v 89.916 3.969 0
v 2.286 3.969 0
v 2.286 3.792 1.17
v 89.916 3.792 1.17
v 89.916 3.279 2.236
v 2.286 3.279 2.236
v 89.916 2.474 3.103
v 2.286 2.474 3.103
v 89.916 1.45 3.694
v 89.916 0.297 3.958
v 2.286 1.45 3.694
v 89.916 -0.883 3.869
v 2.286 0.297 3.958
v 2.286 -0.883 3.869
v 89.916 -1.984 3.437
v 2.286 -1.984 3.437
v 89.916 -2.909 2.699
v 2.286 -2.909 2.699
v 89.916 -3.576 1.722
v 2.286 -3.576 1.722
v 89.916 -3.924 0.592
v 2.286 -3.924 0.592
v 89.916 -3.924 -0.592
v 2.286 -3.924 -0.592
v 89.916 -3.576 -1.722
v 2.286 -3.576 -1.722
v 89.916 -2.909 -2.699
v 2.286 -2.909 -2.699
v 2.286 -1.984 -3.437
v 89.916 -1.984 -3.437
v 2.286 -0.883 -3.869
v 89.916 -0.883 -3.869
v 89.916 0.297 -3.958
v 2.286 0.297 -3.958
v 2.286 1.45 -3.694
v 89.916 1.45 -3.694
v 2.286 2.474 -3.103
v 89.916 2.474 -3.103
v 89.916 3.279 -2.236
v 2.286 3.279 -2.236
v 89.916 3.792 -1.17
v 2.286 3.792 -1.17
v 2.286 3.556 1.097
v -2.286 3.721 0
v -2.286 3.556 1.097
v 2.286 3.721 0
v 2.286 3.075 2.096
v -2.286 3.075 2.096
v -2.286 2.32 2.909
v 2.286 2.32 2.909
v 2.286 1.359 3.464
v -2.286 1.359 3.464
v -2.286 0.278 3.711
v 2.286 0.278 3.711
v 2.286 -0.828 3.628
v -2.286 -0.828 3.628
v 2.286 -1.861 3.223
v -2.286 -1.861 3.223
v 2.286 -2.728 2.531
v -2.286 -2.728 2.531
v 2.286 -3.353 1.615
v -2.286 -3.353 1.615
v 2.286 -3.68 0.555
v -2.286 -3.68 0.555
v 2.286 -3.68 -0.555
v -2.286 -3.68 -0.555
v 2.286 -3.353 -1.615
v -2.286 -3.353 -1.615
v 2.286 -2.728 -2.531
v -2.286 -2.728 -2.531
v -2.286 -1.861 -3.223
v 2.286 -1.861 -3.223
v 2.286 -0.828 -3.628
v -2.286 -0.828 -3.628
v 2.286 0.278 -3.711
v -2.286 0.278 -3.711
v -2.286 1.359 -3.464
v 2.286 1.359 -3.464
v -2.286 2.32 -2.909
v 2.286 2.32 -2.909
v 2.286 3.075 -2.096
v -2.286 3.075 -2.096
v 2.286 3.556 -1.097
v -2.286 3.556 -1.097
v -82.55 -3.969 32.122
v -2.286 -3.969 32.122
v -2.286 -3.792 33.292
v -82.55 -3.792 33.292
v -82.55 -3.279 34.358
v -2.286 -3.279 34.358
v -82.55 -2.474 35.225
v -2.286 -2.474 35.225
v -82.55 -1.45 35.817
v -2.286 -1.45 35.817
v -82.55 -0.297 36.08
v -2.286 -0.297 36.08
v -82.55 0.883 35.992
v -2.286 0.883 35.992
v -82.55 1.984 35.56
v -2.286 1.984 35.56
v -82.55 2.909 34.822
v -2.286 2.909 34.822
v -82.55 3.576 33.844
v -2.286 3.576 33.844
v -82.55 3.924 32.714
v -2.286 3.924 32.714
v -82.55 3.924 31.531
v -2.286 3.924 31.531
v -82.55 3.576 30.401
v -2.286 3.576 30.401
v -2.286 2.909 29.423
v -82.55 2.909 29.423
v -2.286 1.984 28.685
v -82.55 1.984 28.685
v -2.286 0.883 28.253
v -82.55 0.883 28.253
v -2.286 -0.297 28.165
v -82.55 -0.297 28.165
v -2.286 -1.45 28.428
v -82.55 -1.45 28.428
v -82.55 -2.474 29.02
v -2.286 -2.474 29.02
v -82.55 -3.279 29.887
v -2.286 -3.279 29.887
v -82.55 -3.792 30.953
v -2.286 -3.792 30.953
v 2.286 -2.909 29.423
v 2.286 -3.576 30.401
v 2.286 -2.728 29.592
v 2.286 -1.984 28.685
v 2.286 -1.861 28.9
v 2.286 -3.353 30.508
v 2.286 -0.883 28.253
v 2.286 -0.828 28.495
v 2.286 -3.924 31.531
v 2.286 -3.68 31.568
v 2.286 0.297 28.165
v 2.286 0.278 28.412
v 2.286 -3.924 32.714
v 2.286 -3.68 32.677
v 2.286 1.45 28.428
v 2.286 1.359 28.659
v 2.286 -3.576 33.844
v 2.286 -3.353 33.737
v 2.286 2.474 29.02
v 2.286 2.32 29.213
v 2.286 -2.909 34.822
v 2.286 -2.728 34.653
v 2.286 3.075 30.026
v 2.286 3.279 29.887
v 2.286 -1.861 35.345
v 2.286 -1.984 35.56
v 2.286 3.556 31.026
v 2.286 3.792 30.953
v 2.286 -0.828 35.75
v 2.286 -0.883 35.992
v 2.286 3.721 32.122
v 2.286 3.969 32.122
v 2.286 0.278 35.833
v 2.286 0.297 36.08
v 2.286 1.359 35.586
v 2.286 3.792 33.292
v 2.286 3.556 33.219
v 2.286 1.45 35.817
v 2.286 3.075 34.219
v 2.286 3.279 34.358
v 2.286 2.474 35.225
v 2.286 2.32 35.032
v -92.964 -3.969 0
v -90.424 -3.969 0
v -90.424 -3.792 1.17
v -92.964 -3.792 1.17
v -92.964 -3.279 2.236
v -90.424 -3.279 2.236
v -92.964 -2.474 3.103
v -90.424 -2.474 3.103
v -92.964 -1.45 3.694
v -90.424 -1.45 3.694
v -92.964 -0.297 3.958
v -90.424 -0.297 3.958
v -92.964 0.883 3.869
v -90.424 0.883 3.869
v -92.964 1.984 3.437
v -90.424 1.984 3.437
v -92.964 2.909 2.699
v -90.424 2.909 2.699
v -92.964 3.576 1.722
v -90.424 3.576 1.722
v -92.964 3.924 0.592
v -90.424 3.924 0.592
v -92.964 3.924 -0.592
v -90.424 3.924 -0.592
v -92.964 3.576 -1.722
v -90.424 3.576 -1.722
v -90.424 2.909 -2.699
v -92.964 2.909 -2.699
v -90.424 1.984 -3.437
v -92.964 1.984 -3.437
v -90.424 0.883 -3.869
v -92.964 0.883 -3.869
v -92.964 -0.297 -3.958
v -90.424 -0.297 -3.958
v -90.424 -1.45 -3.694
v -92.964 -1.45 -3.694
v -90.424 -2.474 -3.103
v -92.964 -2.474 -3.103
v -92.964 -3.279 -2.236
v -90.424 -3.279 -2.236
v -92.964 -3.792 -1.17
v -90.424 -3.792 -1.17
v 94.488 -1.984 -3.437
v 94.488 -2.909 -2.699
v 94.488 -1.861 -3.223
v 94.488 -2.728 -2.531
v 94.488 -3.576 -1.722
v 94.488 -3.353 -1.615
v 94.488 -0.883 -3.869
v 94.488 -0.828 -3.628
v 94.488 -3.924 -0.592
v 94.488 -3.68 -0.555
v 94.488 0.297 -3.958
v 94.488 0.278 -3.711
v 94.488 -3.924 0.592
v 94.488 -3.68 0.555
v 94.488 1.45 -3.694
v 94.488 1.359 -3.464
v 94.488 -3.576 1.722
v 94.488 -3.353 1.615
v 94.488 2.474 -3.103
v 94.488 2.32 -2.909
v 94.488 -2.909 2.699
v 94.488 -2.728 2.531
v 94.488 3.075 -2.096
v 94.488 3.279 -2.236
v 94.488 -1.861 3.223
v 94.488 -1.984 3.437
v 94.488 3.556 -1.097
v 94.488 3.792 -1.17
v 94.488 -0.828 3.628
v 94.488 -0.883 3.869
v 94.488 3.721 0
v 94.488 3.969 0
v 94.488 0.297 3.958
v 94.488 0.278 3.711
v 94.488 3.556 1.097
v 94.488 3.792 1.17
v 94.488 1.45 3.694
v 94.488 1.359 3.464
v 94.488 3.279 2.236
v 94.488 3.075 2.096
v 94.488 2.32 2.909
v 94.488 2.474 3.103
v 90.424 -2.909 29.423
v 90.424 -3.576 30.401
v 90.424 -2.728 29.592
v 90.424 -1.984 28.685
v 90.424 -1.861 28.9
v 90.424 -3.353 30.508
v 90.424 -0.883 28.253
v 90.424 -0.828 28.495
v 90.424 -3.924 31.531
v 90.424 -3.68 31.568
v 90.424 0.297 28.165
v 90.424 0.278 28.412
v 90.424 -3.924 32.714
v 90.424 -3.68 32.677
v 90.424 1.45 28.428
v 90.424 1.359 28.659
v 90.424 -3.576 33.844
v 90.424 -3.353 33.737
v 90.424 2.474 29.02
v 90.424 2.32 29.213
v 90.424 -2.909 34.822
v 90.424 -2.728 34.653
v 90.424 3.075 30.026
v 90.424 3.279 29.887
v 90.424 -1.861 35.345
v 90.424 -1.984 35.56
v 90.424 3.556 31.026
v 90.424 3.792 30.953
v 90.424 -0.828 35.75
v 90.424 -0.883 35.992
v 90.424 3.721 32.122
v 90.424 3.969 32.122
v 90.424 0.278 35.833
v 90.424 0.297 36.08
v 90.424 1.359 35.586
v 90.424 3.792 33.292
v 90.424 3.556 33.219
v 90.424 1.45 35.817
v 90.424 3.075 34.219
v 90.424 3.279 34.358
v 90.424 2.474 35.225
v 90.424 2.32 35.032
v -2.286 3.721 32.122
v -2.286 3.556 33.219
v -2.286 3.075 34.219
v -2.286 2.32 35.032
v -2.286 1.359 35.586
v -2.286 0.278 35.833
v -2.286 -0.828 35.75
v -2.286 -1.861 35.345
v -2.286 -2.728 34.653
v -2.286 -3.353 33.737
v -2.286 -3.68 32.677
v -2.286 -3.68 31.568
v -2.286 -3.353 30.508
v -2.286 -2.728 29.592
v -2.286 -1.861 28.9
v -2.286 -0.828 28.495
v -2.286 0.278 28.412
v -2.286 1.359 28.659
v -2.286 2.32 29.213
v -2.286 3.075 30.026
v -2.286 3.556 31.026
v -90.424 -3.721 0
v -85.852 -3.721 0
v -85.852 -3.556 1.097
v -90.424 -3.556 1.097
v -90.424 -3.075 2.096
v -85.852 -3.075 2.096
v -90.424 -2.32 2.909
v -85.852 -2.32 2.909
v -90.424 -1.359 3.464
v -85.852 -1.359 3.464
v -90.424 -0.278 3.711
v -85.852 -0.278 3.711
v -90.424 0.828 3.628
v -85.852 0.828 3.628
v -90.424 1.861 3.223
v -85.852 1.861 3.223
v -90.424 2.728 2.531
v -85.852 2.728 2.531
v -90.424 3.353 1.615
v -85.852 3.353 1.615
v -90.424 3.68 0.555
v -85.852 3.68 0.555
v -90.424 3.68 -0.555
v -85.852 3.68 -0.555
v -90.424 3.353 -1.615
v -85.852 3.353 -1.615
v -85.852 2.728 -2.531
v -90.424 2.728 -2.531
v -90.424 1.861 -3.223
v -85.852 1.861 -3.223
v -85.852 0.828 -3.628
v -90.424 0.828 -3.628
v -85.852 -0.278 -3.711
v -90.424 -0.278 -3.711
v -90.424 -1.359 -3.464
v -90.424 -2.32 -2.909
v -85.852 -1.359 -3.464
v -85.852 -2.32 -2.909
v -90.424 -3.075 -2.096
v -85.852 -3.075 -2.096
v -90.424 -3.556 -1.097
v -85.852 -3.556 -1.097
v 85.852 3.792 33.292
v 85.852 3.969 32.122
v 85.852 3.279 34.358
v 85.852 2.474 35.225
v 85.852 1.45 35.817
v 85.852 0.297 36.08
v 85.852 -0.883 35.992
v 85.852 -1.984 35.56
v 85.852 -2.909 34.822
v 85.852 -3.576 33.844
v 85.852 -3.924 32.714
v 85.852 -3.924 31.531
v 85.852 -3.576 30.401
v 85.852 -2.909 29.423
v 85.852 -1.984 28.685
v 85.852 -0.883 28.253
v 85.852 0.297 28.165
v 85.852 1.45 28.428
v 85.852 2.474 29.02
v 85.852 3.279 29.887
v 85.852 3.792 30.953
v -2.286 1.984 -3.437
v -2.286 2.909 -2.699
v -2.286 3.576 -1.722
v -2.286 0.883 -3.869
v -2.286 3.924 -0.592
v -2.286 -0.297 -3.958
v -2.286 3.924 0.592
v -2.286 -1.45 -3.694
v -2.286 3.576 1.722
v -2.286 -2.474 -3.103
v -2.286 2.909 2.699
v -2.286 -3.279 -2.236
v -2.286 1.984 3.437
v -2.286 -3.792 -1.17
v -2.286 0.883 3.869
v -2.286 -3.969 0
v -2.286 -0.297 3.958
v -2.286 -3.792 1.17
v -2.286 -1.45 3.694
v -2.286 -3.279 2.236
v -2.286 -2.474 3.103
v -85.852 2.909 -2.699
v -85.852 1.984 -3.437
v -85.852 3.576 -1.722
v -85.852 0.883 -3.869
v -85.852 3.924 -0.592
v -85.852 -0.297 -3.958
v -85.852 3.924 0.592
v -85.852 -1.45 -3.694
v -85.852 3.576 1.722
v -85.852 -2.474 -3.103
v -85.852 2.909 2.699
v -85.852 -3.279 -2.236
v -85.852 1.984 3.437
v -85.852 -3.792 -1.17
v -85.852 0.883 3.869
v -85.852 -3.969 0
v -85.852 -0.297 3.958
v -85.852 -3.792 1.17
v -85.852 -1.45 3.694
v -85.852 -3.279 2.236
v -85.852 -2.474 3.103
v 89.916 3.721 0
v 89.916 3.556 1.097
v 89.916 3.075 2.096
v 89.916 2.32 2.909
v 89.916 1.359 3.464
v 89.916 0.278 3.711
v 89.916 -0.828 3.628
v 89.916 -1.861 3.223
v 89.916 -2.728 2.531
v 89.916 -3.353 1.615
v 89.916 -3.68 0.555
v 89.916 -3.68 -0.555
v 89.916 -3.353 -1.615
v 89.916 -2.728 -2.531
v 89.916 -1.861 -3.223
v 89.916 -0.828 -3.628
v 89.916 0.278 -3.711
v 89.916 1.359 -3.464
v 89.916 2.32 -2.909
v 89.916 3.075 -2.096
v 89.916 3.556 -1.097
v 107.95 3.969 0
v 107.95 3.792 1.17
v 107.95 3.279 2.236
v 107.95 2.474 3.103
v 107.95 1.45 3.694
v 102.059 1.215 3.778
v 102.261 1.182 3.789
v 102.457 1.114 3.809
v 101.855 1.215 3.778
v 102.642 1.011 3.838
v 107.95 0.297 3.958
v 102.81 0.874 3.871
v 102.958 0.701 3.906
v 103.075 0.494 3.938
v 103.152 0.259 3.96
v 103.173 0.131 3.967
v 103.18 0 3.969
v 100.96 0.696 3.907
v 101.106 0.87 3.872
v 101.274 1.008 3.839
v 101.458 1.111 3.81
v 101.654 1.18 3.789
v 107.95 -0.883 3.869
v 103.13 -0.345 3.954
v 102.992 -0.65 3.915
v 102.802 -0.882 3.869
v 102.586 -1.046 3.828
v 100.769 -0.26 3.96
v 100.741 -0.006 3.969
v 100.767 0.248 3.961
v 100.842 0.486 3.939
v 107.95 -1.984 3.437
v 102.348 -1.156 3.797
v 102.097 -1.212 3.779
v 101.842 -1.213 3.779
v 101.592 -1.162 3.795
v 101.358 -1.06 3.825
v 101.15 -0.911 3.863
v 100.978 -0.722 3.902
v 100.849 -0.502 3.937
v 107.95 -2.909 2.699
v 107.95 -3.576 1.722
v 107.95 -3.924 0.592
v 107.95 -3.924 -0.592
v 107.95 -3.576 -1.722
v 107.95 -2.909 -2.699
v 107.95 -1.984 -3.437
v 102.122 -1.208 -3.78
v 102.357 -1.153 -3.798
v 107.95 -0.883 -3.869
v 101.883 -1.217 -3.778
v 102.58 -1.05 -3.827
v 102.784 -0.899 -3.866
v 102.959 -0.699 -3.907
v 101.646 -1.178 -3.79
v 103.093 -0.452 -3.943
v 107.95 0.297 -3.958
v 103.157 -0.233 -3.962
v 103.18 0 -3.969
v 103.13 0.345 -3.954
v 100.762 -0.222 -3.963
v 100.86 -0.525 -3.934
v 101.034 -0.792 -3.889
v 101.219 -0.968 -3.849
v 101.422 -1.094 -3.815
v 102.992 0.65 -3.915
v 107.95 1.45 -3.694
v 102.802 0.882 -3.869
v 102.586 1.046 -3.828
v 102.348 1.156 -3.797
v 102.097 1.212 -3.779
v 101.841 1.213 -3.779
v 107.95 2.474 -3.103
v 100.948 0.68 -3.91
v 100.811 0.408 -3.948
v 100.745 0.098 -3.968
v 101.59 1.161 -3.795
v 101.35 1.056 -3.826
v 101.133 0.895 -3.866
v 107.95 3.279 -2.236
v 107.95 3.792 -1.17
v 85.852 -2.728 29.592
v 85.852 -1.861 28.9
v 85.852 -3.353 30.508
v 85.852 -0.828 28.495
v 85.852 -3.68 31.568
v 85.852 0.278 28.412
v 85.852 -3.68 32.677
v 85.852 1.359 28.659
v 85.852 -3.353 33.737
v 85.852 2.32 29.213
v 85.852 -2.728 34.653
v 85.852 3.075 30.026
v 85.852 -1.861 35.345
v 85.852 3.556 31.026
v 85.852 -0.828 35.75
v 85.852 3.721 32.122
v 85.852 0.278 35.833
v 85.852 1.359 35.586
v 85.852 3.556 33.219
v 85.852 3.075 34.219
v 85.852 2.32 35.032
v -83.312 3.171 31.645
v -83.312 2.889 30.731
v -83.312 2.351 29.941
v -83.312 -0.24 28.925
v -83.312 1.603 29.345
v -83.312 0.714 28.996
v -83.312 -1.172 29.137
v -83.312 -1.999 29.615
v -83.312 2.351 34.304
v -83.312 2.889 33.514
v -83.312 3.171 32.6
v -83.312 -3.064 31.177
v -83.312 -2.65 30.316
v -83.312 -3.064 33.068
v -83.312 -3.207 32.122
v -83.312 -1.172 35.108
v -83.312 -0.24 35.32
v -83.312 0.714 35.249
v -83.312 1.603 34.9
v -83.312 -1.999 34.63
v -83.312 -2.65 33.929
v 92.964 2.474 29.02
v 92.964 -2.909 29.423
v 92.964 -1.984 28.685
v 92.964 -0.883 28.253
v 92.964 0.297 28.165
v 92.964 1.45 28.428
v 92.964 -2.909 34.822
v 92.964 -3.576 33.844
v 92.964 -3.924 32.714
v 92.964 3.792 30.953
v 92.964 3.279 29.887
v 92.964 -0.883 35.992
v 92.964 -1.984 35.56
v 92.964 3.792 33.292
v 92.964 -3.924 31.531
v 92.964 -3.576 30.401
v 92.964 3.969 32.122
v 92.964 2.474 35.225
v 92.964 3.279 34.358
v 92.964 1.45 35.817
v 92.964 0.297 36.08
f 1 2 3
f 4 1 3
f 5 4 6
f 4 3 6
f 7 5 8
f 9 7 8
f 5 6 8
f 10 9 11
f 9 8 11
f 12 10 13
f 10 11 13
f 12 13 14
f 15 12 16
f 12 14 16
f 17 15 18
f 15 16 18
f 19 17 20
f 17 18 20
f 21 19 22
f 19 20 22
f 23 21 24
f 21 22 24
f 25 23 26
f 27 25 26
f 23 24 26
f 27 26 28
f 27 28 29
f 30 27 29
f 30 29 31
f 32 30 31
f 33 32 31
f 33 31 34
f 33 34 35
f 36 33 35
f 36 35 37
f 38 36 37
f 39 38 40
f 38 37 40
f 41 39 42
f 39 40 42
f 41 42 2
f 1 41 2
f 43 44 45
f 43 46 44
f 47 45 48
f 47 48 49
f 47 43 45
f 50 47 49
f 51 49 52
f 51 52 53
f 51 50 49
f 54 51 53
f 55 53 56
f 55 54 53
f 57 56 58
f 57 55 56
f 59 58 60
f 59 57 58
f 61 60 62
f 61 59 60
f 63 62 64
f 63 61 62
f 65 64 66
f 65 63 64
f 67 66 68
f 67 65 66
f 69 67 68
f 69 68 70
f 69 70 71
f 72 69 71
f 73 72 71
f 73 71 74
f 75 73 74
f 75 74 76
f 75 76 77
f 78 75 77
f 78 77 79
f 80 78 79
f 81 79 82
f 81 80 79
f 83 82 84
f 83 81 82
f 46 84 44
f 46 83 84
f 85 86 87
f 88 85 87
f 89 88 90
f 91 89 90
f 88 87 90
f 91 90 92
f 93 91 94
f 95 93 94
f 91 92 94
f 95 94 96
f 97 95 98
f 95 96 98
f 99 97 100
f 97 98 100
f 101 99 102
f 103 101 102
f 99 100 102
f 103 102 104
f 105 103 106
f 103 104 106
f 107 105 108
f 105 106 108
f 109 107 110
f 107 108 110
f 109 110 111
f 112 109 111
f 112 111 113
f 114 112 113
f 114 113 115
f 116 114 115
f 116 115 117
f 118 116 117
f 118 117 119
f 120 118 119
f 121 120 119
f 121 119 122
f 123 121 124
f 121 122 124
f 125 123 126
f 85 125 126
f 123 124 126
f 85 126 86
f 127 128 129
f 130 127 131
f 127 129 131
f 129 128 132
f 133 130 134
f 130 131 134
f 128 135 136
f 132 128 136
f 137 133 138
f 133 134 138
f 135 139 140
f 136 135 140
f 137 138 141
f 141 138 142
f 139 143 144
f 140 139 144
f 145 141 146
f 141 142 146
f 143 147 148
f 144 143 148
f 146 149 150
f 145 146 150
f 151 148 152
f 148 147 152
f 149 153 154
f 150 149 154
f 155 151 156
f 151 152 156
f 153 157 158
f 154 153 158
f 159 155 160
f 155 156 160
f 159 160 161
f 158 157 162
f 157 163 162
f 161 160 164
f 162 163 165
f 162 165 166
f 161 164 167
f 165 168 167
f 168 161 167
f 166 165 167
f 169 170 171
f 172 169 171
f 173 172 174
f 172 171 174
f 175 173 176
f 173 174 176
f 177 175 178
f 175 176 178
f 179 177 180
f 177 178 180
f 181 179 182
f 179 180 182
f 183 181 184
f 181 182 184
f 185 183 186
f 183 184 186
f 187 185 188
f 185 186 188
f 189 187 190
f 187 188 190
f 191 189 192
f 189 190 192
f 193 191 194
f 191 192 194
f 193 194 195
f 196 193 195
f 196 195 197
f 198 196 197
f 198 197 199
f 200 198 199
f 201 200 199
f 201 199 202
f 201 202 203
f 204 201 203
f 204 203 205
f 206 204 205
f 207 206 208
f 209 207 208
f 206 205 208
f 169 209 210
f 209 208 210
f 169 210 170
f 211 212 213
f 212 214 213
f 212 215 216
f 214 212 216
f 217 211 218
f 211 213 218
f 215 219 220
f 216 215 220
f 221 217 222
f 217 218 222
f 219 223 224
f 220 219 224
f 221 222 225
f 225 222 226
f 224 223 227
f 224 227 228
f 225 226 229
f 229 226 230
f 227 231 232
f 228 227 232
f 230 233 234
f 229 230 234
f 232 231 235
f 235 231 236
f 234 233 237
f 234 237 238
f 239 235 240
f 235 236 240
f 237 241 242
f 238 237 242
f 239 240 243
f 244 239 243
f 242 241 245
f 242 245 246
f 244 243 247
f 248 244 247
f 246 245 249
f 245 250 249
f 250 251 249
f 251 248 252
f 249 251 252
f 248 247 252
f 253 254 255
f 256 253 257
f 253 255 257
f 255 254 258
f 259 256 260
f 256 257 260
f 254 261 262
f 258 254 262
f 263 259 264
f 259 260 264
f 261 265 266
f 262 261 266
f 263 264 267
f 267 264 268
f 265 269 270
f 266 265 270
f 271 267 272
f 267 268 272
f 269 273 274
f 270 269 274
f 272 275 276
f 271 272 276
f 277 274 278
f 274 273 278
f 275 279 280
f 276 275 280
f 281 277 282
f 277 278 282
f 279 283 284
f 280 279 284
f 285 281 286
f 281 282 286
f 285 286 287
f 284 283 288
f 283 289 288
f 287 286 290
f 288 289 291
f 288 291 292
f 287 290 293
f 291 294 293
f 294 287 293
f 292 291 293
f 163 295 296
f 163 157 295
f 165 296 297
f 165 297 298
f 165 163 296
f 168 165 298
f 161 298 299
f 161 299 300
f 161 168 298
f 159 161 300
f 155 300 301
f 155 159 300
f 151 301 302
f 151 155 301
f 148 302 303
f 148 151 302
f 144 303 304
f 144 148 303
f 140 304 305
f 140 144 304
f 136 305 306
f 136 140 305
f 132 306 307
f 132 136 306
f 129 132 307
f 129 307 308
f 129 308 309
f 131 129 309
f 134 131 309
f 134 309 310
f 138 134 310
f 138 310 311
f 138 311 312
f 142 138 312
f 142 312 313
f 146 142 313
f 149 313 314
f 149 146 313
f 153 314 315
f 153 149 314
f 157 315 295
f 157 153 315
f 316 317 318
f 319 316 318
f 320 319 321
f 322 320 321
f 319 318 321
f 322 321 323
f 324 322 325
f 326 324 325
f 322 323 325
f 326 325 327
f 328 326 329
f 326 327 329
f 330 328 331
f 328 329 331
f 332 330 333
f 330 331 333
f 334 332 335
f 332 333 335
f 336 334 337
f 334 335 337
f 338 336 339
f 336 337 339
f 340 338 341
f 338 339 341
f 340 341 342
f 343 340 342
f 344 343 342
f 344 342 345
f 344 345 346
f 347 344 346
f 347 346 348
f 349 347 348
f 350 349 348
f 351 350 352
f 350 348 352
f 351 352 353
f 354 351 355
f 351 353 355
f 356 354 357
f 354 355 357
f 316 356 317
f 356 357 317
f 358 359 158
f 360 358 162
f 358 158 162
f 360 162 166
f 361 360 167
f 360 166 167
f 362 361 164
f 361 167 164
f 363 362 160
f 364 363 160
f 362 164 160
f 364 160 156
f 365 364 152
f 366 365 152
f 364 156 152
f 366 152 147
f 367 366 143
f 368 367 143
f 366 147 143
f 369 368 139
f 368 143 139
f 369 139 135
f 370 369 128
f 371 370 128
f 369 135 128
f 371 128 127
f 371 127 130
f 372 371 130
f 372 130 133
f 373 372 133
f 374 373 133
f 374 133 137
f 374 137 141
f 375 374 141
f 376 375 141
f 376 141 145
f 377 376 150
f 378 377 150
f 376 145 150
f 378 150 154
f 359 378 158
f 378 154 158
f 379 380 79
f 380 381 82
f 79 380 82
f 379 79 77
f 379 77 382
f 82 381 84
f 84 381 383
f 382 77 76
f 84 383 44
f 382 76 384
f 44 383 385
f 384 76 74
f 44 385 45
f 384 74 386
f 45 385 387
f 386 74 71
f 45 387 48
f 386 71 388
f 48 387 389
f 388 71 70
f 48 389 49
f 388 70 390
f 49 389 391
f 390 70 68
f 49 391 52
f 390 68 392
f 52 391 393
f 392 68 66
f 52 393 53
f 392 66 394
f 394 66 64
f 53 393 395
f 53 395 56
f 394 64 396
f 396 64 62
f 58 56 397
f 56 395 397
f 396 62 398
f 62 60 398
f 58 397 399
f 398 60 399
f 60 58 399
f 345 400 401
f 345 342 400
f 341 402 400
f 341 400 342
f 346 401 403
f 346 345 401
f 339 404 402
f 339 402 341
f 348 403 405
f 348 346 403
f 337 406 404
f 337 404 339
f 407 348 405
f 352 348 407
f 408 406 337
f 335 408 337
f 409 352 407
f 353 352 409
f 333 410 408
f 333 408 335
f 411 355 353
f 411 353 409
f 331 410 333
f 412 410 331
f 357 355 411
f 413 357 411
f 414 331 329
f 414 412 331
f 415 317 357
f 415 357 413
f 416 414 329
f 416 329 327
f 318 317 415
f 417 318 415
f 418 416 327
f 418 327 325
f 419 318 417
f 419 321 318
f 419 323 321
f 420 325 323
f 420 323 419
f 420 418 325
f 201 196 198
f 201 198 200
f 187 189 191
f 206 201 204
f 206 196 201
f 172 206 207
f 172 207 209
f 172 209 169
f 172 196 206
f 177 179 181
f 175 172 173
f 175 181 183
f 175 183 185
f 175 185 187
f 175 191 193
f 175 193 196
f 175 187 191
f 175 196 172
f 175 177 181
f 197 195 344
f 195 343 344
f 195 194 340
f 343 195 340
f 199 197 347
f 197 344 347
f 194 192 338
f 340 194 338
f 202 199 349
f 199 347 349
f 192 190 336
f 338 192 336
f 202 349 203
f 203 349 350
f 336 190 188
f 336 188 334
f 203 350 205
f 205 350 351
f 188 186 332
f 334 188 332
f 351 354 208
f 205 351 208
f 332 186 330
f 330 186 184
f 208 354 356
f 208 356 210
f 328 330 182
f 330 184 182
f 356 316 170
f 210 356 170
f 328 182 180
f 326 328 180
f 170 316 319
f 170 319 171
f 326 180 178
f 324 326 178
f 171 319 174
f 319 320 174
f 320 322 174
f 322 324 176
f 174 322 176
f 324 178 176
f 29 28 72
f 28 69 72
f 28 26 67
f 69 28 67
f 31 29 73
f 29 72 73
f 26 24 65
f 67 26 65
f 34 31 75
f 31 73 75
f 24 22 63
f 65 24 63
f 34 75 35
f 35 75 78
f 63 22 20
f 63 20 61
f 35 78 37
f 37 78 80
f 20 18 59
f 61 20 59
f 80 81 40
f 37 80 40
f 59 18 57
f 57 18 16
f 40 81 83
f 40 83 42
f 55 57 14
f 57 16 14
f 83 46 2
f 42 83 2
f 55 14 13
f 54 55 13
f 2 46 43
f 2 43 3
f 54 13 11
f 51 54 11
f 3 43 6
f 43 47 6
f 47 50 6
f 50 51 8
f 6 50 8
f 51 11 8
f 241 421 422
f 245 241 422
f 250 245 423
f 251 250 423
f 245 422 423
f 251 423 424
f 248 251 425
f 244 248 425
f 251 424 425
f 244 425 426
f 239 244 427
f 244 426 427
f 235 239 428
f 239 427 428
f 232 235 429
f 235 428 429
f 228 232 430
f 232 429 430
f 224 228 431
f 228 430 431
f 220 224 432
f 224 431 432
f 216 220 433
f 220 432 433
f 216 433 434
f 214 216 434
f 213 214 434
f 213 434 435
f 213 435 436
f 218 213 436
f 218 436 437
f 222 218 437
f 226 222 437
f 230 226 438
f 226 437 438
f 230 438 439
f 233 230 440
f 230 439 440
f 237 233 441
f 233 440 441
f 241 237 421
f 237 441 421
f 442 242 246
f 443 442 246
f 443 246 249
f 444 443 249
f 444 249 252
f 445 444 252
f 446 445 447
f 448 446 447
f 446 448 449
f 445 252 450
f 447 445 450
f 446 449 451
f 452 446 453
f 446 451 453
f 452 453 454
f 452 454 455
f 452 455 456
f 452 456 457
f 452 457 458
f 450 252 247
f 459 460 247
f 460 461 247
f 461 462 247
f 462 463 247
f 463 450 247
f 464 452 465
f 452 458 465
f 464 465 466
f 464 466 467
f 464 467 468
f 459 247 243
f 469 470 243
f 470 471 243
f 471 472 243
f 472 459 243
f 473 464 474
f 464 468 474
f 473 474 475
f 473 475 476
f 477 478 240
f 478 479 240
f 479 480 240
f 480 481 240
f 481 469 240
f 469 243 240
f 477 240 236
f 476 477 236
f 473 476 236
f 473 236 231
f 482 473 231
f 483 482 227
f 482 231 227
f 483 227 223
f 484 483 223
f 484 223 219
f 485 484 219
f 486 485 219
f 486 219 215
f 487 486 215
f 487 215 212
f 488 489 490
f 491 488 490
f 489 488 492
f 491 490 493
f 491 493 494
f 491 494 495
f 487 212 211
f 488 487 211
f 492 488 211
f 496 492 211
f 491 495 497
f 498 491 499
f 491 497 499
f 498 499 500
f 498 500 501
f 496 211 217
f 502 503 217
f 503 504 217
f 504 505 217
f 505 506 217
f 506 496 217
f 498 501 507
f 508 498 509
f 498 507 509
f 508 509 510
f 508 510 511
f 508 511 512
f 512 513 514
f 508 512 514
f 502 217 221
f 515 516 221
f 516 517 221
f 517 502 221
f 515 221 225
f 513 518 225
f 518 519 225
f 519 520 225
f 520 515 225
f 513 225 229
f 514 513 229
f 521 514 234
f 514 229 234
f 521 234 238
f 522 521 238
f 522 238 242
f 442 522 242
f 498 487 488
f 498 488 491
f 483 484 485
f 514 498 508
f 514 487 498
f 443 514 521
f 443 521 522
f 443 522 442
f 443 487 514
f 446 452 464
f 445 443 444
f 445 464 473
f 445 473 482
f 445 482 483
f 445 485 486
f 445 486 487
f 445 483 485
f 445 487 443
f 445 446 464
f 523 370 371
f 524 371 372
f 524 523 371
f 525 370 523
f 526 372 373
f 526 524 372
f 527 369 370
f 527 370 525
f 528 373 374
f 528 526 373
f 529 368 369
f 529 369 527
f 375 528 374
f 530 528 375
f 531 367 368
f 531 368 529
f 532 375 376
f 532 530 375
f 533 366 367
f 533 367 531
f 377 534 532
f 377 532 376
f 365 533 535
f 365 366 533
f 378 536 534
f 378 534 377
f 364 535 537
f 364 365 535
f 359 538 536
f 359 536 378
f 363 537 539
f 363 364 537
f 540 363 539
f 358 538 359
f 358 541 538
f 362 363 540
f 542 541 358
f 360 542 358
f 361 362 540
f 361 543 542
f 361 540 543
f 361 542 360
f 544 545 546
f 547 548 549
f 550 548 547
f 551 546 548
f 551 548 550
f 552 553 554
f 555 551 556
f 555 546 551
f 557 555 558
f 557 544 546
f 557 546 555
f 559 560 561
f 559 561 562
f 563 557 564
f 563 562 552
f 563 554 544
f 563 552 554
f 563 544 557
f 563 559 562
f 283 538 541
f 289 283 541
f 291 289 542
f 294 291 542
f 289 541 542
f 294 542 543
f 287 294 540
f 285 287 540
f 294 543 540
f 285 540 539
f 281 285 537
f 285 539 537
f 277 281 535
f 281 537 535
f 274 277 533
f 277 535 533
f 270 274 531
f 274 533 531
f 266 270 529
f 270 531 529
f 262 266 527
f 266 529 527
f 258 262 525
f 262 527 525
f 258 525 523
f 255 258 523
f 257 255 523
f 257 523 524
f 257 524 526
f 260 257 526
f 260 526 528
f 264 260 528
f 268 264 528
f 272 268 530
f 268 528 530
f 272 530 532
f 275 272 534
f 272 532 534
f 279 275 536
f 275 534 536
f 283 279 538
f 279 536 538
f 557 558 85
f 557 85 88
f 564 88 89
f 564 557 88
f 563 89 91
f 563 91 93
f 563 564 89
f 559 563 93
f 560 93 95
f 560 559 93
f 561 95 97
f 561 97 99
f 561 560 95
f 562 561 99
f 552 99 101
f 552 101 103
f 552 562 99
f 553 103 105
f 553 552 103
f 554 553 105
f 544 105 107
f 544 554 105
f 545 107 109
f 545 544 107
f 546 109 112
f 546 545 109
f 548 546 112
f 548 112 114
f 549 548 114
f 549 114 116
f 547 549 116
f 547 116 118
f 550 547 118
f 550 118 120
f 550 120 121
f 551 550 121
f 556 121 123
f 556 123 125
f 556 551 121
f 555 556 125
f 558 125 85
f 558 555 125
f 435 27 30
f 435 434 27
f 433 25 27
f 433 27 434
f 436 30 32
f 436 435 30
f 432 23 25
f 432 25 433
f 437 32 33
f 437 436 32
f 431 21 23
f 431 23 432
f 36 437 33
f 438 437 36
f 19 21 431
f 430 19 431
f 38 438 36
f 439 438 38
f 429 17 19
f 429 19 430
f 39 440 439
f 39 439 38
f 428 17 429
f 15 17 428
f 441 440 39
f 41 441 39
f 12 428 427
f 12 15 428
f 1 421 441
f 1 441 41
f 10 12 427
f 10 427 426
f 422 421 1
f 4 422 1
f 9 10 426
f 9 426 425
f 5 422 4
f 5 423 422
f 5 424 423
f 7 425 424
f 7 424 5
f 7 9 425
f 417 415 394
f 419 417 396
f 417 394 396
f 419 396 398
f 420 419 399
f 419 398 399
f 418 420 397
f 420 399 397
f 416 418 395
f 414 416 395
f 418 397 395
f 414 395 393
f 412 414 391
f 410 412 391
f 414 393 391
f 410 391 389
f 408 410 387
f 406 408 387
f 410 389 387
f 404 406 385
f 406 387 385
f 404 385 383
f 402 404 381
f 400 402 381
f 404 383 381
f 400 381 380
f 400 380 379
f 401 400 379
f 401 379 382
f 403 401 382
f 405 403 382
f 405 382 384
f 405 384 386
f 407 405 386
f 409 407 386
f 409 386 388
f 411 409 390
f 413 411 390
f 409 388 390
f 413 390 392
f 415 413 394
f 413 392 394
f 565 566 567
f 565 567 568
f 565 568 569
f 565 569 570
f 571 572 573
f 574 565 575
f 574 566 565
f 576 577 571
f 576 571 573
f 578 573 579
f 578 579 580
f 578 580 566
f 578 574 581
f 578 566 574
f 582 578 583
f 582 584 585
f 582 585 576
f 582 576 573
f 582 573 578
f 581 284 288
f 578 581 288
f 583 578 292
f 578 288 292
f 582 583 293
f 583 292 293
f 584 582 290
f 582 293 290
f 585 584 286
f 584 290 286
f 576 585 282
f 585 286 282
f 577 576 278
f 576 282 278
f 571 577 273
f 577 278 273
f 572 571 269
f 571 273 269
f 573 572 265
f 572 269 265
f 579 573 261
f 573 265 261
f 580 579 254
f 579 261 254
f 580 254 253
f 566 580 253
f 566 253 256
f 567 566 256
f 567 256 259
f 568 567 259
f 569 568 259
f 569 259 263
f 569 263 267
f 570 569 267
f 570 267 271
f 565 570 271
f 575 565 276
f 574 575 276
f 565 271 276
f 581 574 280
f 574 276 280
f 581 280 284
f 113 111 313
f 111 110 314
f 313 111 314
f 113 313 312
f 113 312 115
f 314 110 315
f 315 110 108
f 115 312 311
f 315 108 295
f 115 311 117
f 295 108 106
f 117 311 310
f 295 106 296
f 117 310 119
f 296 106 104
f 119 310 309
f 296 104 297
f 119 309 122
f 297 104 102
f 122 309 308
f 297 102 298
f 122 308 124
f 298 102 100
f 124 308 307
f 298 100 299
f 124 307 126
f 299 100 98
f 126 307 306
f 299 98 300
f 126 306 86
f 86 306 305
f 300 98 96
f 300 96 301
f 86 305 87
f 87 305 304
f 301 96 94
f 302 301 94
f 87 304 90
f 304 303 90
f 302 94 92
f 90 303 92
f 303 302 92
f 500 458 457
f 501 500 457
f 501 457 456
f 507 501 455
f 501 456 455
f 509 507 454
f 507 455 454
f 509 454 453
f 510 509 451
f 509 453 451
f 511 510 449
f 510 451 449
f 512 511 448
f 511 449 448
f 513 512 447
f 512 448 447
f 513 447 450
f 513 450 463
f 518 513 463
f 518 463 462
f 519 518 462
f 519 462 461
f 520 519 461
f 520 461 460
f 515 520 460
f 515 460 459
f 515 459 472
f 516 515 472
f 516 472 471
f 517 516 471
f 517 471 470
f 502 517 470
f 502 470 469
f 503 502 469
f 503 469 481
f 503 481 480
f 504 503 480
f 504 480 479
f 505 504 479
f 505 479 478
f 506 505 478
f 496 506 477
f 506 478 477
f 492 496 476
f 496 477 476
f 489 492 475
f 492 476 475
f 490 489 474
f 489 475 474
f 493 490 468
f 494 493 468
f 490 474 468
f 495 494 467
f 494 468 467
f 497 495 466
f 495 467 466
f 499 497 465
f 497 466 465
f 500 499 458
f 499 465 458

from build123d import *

# Parameters (mm, degrees)
F0_R           = 3.7211
F1_DEPTH       = 2.286
F1_DEPTH_BACK  = 2.286
F2_R           = 3.96875
F2_R_2         = 3.7211
F3_DEPTH       = 87.63
F4_R           = 3.7211
F5_DEPTH       = 4.572
F6_R           = 3.96875
F6_R_2         = 3.7211
F7_DEPTH       = 13.462
F8_R           = 3.96875
F8_R_2         = 3.7211
F9_DEPTH       = 83.566
F10_R          = 3.7211
F11_DEPTH      = 4.572
F12_R          = 3.96875
F12_R_2        = 3.7211
F13_DEPTH      = 2.54
F16_R          = 1.2192
F17_DEPTH      = 25.4
F18_R          = 3.7211
F19_DEPTH      = 2.286
F19_DEPTH_BACK = 2.286
F20_R          = 3.96875
F20_R_2        = 3.7211
F21_DEPTH      = 83.566
F22_R          = 3.7211
F23_DEPTH      = 4.572
F24_R          = 3.96875
F24_R_2        = 3.7211
F25_DEPTH      = 2.54
F26_R          = 3.96875
F26_R_2        = 3.7211
F27_DEPTH      = 81.026
F28_SIZE       = 0.762


with BuildPart() as f1:
    # F0 (on Right) → F1 (new body, two sides)
    with BuildSketch(Plane.YZ) as f1_sk:
        Circle(F0_R)
    extrude(amount=F1_DEPTH)
    extrude(f1_sk.sketch, amount=-F1_DEPTH_BACK)

    # F2 (on face) → F3 (join)
    with BuildSketch(Plane.YZ.offset(2.286)):
        Circle(F2_R)
        Circle(F2_R_2, mode=Mode.SUBTRACT)
        Circle(F2_R_2)
    extrude(amount=F3_DEPTH)

    # F4 (on face) → F5 (join)
    with BuildSketch(Plane.YZ.offset(89.916)):
        Circle(F4_R)
    extrude(amount=F5_DEPTH)

    # F6 (on face) → F7 (join)
    with BuildSketch(Plane.YZ.offset(94.488)):
        Circle(F6_R)
        Circle(F6_R_2, mode=Mode.SUBTRACT)
        Circle(F6_R_2)
    extrude(amount=F7_DEPTH)

    # F8 (on face) → F9 (join)
    with BuildSketch(Plane(origin=(-2.286, 0, 0), x_dir=(0, -1, 0), z_dir=(-1, 0, 0))):
        Circle(F8_R)
        Circle(F8_R_2, mode=Mode.SUBTRACT)
        Circle(F8_R_2)
    extrude(amount=F9_DEPTH)

    # F10 (on face) → F11 (join)
    with BuildSketch(Plane(origin=(-85.852, 0, 0), x_dir=(0, -1, 0), z_dir=(-1, 0, 0))):
        Circle(F10_R)
    extrude(amount=F11_DEPTH)

    # F12 (on face) → F13 (join)
    with BuildSketch(Plane(origin=(-90.424, 0, 0), x_dir=(0, -1, 0), z_dir=(-1, 0, 0))):
        Circle(F12_R)
        Circle(F12_R_2, mode=Mode.SUBTRACT)
        Circle(F12_R_2)
    extrude(amount=F13_DEPTH)

    # F16 (on plane+point) → F17 (cut)
    with BuildSketch(Plane.XY.offset(3.96875)):
        with Locations((101.9604578614, 0)):
            Circle(F16_R)
    extrude(amount=-F17_DEPTH, mode=Mode.SUBTRACT)


with BuildPart() as f19:
    # F18 (on Right) → F19 (new body, two sides)
    with BuildSketch(Plane.YZ) as f19_sk:
        with Locations((0, 32.1224965155)):
            Circle(F18_R)
    extrude(amount=F19_DEPTH)
    extrude(f19_sk.sketch, amount=-F19_DEPTH_BACK)

    # F20 (on face) → F21 (join)
    with BuildSketch(Plane.YZ.offset(2.286)):
        with Locations((0, 32.1224965155)):
            Circle(F20_R)
        with Locations((0, 32.1224965155)):
            Circle(F20_R_2, mode=Mode.SUBTRACT)
        with Locations((0, 32.1224965155)):
            Circle(F20_R_2)
    extrude(amount=F21_DEPTH)

    # F22 (on face) → F23 (join)
    with BuildSketch(Plane.YZ.offset(85.852)):
        with Locations((0, 32.1224965155)):
            Circle(F22_R)
    extrude(amount=F23_DEPTH)

    # F24 (on face) → F25 (join)
    with BuildSketch(Plane.YZ.offset(90.424)):
        with Locations((0, 32.1224965155)):
            Circle(F24_R)
        with Locations((0, 32.1224965155)):
            Circle(F24_R_2, mode=Mode.SUBTRACT)
        with Locations((0, 32.1224965155)):
            Circle(F24_R_2)
    extrude(amount=F25_DEPTH)

    # F26 (on face) → F27 (join)
    with BuildSketch(Plane(origin=(-2.286, 0, 0), x_dir=(0, -1, 0), z_dir=(-1, 0, 0))):
        with Locations((0, 32.1224965155)):
            Circle(F26_R)
        with Locations((0, 32.1224965155)):
            Circle(F26_R_2, mode=Mode.SUBTRACT)
        with Locations((0, 32.1224965155)):
            Circle(F26_R_2)
    extrude(amount=F27_DEPTH)

    # F28
    f28_edges = [f19.edges().sort_by_distance(p)[0] for p in [
        (-83.312, 3.96875, 32.122497),
    ]]
    chamfer(f28_edges, length=F28_SIZE)


solid = Compound([f1.part, f19.part])
